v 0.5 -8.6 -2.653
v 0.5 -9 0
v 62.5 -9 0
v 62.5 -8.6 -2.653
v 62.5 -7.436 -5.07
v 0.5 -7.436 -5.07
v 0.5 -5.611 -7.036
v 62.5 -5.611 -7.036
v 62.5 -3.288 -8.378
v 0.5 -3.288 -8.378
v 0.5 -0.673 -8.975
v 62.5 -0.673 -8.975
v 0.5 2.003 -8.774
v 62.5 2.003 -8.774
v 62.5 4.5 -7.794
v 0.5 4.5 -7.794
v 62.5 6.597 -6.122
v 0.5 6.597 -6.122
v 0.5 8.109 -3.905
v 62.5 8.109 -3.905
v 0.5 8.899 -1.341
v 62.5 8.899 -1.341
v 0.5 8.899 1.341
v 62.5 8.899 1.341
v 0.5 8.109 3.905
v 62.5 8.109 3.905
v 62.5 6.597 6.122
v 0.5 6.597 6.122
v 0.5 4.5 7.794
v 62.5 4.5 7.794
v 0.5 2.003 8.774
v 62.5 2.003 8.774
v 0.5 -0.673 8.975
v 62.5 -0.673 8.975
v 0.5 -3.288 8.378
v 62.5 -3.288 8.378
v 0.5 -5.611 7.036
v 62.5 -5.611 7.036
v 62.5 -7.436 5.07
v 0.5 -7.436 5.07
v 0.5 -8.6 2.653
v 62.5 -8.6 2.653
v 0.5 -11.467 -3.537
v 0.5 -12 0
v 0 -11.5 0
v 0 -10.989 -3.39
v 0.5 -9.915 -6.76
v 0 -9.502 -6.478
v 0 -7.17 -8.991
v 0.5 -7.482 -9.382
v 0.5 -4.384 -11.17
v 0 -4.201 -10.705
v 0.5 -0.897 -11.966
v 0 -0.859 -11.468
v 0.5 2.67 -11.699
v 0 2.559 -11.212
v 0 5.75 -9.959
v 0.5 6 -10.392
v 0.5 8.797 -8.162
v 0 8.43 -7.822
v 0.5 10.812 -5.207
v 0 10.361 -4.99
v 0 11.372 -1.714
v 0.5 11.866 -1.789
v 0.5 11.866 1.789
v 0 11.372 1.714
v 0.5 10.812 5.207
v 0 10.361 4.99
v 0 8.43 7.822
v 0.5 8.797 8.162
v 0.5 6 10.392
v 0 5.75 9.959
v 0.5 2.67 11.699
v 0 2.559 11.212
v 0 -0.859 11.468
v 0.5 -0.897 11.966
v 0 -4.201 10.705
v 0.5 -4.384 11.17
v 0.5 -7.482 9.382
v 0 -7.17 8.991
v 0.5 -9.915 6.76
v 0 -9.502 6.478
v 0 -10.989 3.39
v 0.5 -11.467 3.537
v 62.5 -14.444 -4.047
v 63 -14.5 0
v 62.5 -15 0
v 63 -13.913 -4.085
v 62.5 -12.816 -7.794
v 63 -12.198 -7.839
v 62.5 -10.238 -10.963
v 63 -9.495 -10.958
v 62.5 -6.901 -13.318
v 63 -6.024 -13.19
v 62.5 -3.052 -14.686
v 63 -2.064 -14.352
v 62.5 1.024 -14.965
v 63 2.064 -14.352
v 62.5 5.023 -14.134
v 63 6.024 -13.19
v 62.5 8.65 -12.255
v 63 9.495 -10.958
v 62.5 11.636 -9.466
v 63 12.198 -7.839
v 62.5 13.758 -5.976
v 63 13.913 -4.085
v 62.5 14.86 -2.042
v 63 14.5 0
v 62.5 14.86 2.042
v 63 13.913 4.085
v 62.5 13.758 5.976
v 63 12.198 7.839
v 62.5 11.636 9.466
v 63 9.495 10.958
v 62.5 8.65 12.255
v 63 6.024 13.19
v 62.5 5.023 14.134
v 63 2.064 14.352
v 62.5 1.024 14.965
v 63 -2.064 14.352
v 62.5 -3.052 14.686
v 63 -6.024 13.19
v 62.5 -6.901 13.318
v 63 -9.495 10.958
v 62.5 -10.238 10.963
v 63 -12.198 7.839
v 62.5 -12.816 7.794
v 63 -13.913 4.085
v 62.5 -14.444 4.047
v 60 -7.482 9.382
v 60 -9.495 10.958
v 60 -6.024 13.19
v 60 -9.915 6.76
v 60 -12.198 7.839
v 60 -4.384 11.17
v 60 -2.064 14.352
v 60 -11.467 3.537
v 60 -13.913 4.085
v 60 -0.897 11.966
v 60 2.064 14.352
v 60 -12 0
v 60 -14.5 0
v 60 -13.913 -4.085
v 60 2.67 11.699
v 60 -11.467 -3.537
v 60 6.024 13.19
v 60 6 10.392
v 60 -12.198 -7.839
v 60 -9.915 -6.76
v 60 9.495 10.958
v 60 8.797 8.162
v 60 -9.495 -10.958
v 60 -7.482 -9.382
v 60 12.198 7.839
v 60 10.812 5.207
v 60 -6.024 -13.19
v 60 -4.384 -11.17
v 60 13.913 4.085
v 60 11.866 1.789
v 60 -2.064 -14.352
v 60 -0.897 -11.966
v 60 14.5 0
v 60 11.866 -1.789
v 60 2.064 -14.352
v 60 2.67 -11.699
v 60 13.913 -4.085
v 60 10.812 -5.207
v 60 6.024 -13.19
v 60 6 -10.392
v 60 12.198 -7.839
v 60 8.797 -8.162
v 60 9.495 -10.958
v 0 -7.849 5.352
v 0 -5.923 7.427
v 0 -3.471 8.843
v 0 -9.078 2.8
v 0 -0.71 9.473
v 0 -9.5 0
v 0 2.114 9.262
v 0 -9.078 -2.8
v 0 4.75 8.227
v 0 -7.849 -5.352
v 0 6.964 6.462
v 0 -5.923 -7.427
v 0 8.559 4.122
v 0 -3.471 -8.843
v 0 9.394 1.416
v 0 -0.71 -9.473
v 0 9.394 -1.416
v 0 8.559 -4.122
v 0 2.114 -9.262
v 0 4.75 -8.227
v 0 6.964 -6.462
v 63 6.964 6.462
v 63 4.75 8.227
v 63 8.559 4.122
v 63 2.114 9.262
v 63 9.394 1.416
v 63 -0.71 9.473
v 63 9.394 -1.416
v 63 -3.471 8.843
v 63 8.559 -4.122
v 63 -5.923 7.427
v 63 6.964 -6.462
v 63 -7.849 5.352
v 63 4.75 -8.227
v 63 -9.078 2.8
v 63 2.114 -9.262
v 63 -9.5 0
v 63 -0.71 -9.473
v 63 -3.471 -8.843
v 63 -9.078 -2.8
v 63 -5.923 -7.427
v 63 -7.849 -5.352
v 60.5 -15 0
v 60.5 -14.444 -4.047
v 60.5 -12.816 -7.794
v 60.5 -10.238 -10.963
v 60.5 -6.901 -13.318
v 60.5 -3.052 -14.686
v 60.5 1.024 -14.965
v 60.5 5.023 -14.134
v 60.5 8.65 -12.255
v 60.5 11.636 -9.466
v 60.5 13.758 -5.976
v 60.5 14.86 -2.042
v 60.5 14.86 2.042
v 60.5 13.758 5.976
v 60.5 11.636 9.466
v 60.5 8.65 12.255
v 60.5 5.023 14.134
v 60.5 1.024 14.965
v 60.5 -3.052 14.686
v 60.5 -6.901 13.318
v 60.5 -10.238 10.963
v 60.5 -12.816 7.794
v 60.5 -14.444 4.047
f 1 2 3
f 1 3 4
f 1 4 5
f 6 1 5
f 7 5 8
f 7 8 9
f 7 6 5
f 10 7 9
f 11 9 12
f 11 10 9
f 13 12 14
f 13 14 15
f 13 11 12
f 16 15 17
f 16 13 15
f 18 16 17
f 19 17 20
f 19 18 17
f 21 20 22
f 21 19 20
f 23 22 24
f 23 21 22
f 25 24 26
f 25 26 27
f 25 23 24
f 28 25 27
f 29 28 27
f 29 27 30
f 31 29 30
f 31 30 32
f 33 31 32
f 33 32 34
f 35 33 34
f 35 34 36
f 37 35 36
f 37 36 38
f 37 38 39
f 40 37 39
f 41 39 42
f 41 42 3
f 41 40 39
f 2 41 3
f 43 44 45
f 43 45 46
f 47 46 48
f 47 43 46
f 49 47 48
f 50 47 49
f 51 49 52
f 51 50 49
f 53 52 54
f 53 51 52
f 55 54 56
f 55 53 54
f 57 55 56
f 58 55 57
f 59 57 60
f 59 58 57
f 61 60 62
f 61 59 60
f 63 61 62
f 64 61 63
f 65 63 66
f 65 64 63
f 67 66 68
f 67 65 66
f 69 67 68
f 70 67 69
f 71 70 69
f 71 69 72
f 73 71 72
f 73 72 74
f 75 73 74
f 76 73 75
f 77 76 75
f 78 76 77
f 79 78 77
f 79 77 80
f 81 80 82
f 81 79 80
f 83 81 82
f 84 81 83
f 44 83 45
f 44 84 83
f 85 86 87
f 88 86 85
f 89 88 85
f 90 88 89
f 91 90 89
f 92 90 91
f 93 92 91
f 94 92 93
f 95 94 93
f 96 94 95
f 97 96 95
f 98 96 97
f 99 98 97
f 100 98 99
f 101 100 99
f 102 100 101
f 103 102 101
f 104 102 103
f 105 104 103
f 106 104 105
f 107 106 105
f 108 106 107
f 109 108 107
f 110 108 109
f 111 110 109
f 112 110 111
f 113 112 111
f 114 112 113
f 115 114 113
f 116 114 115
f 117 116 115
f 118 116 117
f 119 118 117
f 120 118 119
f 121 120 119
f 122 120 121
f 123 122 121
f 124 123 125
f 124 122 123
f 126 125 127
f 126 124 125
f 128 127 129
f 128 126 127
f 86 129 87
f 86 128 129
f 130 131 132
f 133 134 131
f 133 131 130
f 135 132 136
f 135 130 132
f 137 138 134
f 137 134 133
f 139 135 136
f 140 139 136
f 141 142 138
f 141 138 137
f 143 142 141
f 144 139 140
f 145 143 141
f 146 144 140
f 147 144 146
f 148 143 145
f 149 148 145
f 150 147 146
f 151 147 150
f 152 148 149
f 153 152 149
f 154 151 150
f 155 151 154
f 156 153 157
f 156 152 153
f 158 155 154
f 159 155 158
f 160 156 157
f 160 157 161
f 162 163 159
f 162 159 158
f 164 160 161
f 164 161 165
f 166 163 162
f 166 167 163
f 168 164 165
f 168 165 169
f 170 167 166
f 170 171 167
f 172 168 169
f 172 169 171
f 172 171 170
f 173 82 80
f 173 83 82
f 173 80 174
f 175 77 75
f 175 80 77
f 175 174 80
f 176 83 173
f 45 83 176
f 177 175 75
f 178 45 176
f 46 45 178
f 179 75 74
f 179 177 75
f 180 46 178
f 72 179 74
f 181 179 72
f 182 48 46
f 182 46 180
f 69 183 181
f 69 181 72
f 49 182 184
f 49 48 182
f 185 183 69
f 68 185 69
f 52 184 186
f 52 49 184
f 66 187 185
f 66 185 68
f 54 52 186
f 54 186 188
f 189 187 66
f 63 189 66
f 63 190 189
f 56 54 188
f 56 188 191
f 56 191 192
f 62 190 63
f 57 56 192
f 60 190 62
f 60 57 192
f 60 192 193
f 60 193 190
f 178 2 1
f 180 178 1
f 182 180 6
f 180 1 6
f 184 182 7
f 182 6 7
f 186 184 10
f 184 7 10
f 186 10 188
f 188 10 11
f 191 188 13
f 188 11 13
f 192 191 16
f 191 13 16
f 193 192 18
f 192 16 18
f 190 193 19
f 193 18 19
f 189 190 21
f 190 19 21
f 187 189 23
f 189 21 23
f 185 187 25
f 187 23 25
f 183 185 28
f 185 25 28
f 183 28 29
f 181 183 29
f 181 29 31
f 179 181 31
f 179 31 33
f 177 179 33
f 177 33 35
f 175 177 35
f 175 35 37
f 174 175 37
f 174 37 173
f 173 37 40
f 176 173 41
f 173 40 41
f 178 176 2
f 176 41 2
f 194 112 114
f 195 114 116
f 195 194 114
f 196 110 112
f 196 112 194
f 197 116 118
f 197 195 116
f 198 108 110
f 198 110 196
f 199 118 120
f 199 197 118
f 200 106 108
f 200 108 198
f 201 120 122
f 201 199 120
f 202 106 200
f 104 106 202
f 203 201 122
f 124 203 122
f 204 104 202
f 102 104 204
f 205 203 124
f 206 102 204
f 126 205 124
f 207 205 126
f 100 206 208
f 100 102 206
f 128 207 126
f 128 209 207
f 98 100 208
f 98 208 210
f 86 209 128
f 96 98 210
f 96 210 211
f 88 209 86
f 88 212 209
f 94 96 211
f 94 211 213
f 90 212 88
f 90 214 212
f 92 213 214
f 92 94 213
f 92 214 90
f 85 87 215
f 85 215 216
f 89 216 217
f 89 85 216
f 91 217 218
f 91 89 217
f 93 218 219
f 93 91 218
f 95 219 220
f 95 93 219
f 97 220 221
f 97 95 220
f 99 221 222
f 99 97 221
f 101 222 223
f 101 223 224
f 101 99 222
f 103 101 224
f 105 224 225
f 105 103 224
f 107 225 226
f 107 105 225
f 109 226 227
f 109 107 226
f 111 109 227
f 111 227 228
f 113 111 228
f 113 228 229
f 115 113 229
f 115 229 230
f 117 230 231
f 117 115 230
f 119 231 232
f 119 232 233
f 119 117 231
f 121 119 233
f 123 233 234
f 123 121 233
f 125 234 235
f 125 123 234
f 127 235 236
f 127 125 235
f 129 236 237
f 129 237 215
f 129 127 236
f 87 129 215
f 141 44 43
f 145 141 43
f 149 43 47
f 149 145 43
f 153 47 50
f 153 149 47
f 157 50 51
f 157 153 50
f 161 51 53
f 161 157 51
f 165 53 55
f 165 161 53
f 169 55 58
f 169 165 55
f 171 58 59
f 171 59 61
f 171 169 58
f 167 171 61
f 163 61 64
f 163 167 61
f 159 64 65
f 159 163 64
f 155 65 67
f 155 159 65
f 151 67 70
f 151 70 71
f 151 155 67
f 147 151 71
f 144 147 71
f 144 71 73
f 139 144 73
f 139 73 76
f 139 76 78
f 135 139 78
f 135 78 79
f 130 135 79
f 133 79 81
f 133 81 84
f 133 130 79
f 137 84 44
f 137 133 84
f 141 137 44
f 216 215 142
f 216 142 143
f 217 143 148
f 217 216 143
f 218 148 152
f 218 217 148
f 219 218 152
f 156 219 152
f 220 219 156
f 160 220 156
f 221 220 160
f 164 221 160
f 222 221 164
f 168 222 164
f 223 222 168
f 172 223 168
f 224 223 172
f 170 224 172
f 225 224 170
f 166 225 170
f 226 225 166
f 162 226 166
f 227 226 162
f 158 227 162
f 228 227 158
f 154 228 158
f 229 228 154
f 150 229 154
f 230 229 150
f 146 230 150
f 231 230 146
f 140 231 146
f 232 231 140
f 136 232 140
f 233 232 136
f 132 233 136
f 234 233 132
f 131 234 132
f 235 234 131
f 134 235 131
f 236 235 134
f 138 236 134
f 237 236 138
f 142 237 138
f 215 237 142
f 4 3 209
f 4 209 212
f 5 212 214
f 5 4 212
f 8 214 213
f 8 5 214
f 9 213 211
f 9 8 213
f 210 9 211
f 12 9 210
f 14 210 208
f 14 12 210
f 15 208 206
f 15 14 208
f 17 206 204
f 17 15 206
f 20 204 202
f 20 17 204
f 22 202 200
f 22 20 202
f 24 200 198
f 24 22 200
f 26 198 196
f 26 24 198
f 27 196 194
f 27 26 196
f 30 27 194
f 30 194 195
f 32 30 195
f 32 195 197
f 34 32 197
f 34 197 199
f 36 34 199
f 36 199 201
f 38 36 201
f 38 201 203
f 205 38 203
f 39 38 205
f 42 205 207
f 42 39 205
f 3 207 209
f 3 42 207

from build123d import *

# Parameters (mm, degrees)
CHAMFER_1_SIZE = 0.5


with BuildPart() as part:
    # Эскиз1 → Повернуть1 (revolve)
    with BuildSketch(Plane.XY, mode=Mode.PRIVATE) as revolve_1_sk:
        Polygon((0, 9), (0, 12), (60, 12), (60, 15), (63, 15), (63, 9), align=None)
    revolve(revolve_1_sk.sketch.rotate(Axis((0, 0, 0), (1, 0, 0)), 180), axis=Axis((0, 0, 0), (1, 0, 0)))

    # Фаска1
    chamfer_1_edges = [part.edges().sort_by_distance(p)[0] for p in [
        (60, 15, 0),
        (0, 12, 0),
        (0, 9, 0),
        (63, 9, 0),
        (63, 15, 0),
    ]]
    chamfer(chamfer_1_edges, length=CHAMFER_1_SIZE)


solid = part.part
